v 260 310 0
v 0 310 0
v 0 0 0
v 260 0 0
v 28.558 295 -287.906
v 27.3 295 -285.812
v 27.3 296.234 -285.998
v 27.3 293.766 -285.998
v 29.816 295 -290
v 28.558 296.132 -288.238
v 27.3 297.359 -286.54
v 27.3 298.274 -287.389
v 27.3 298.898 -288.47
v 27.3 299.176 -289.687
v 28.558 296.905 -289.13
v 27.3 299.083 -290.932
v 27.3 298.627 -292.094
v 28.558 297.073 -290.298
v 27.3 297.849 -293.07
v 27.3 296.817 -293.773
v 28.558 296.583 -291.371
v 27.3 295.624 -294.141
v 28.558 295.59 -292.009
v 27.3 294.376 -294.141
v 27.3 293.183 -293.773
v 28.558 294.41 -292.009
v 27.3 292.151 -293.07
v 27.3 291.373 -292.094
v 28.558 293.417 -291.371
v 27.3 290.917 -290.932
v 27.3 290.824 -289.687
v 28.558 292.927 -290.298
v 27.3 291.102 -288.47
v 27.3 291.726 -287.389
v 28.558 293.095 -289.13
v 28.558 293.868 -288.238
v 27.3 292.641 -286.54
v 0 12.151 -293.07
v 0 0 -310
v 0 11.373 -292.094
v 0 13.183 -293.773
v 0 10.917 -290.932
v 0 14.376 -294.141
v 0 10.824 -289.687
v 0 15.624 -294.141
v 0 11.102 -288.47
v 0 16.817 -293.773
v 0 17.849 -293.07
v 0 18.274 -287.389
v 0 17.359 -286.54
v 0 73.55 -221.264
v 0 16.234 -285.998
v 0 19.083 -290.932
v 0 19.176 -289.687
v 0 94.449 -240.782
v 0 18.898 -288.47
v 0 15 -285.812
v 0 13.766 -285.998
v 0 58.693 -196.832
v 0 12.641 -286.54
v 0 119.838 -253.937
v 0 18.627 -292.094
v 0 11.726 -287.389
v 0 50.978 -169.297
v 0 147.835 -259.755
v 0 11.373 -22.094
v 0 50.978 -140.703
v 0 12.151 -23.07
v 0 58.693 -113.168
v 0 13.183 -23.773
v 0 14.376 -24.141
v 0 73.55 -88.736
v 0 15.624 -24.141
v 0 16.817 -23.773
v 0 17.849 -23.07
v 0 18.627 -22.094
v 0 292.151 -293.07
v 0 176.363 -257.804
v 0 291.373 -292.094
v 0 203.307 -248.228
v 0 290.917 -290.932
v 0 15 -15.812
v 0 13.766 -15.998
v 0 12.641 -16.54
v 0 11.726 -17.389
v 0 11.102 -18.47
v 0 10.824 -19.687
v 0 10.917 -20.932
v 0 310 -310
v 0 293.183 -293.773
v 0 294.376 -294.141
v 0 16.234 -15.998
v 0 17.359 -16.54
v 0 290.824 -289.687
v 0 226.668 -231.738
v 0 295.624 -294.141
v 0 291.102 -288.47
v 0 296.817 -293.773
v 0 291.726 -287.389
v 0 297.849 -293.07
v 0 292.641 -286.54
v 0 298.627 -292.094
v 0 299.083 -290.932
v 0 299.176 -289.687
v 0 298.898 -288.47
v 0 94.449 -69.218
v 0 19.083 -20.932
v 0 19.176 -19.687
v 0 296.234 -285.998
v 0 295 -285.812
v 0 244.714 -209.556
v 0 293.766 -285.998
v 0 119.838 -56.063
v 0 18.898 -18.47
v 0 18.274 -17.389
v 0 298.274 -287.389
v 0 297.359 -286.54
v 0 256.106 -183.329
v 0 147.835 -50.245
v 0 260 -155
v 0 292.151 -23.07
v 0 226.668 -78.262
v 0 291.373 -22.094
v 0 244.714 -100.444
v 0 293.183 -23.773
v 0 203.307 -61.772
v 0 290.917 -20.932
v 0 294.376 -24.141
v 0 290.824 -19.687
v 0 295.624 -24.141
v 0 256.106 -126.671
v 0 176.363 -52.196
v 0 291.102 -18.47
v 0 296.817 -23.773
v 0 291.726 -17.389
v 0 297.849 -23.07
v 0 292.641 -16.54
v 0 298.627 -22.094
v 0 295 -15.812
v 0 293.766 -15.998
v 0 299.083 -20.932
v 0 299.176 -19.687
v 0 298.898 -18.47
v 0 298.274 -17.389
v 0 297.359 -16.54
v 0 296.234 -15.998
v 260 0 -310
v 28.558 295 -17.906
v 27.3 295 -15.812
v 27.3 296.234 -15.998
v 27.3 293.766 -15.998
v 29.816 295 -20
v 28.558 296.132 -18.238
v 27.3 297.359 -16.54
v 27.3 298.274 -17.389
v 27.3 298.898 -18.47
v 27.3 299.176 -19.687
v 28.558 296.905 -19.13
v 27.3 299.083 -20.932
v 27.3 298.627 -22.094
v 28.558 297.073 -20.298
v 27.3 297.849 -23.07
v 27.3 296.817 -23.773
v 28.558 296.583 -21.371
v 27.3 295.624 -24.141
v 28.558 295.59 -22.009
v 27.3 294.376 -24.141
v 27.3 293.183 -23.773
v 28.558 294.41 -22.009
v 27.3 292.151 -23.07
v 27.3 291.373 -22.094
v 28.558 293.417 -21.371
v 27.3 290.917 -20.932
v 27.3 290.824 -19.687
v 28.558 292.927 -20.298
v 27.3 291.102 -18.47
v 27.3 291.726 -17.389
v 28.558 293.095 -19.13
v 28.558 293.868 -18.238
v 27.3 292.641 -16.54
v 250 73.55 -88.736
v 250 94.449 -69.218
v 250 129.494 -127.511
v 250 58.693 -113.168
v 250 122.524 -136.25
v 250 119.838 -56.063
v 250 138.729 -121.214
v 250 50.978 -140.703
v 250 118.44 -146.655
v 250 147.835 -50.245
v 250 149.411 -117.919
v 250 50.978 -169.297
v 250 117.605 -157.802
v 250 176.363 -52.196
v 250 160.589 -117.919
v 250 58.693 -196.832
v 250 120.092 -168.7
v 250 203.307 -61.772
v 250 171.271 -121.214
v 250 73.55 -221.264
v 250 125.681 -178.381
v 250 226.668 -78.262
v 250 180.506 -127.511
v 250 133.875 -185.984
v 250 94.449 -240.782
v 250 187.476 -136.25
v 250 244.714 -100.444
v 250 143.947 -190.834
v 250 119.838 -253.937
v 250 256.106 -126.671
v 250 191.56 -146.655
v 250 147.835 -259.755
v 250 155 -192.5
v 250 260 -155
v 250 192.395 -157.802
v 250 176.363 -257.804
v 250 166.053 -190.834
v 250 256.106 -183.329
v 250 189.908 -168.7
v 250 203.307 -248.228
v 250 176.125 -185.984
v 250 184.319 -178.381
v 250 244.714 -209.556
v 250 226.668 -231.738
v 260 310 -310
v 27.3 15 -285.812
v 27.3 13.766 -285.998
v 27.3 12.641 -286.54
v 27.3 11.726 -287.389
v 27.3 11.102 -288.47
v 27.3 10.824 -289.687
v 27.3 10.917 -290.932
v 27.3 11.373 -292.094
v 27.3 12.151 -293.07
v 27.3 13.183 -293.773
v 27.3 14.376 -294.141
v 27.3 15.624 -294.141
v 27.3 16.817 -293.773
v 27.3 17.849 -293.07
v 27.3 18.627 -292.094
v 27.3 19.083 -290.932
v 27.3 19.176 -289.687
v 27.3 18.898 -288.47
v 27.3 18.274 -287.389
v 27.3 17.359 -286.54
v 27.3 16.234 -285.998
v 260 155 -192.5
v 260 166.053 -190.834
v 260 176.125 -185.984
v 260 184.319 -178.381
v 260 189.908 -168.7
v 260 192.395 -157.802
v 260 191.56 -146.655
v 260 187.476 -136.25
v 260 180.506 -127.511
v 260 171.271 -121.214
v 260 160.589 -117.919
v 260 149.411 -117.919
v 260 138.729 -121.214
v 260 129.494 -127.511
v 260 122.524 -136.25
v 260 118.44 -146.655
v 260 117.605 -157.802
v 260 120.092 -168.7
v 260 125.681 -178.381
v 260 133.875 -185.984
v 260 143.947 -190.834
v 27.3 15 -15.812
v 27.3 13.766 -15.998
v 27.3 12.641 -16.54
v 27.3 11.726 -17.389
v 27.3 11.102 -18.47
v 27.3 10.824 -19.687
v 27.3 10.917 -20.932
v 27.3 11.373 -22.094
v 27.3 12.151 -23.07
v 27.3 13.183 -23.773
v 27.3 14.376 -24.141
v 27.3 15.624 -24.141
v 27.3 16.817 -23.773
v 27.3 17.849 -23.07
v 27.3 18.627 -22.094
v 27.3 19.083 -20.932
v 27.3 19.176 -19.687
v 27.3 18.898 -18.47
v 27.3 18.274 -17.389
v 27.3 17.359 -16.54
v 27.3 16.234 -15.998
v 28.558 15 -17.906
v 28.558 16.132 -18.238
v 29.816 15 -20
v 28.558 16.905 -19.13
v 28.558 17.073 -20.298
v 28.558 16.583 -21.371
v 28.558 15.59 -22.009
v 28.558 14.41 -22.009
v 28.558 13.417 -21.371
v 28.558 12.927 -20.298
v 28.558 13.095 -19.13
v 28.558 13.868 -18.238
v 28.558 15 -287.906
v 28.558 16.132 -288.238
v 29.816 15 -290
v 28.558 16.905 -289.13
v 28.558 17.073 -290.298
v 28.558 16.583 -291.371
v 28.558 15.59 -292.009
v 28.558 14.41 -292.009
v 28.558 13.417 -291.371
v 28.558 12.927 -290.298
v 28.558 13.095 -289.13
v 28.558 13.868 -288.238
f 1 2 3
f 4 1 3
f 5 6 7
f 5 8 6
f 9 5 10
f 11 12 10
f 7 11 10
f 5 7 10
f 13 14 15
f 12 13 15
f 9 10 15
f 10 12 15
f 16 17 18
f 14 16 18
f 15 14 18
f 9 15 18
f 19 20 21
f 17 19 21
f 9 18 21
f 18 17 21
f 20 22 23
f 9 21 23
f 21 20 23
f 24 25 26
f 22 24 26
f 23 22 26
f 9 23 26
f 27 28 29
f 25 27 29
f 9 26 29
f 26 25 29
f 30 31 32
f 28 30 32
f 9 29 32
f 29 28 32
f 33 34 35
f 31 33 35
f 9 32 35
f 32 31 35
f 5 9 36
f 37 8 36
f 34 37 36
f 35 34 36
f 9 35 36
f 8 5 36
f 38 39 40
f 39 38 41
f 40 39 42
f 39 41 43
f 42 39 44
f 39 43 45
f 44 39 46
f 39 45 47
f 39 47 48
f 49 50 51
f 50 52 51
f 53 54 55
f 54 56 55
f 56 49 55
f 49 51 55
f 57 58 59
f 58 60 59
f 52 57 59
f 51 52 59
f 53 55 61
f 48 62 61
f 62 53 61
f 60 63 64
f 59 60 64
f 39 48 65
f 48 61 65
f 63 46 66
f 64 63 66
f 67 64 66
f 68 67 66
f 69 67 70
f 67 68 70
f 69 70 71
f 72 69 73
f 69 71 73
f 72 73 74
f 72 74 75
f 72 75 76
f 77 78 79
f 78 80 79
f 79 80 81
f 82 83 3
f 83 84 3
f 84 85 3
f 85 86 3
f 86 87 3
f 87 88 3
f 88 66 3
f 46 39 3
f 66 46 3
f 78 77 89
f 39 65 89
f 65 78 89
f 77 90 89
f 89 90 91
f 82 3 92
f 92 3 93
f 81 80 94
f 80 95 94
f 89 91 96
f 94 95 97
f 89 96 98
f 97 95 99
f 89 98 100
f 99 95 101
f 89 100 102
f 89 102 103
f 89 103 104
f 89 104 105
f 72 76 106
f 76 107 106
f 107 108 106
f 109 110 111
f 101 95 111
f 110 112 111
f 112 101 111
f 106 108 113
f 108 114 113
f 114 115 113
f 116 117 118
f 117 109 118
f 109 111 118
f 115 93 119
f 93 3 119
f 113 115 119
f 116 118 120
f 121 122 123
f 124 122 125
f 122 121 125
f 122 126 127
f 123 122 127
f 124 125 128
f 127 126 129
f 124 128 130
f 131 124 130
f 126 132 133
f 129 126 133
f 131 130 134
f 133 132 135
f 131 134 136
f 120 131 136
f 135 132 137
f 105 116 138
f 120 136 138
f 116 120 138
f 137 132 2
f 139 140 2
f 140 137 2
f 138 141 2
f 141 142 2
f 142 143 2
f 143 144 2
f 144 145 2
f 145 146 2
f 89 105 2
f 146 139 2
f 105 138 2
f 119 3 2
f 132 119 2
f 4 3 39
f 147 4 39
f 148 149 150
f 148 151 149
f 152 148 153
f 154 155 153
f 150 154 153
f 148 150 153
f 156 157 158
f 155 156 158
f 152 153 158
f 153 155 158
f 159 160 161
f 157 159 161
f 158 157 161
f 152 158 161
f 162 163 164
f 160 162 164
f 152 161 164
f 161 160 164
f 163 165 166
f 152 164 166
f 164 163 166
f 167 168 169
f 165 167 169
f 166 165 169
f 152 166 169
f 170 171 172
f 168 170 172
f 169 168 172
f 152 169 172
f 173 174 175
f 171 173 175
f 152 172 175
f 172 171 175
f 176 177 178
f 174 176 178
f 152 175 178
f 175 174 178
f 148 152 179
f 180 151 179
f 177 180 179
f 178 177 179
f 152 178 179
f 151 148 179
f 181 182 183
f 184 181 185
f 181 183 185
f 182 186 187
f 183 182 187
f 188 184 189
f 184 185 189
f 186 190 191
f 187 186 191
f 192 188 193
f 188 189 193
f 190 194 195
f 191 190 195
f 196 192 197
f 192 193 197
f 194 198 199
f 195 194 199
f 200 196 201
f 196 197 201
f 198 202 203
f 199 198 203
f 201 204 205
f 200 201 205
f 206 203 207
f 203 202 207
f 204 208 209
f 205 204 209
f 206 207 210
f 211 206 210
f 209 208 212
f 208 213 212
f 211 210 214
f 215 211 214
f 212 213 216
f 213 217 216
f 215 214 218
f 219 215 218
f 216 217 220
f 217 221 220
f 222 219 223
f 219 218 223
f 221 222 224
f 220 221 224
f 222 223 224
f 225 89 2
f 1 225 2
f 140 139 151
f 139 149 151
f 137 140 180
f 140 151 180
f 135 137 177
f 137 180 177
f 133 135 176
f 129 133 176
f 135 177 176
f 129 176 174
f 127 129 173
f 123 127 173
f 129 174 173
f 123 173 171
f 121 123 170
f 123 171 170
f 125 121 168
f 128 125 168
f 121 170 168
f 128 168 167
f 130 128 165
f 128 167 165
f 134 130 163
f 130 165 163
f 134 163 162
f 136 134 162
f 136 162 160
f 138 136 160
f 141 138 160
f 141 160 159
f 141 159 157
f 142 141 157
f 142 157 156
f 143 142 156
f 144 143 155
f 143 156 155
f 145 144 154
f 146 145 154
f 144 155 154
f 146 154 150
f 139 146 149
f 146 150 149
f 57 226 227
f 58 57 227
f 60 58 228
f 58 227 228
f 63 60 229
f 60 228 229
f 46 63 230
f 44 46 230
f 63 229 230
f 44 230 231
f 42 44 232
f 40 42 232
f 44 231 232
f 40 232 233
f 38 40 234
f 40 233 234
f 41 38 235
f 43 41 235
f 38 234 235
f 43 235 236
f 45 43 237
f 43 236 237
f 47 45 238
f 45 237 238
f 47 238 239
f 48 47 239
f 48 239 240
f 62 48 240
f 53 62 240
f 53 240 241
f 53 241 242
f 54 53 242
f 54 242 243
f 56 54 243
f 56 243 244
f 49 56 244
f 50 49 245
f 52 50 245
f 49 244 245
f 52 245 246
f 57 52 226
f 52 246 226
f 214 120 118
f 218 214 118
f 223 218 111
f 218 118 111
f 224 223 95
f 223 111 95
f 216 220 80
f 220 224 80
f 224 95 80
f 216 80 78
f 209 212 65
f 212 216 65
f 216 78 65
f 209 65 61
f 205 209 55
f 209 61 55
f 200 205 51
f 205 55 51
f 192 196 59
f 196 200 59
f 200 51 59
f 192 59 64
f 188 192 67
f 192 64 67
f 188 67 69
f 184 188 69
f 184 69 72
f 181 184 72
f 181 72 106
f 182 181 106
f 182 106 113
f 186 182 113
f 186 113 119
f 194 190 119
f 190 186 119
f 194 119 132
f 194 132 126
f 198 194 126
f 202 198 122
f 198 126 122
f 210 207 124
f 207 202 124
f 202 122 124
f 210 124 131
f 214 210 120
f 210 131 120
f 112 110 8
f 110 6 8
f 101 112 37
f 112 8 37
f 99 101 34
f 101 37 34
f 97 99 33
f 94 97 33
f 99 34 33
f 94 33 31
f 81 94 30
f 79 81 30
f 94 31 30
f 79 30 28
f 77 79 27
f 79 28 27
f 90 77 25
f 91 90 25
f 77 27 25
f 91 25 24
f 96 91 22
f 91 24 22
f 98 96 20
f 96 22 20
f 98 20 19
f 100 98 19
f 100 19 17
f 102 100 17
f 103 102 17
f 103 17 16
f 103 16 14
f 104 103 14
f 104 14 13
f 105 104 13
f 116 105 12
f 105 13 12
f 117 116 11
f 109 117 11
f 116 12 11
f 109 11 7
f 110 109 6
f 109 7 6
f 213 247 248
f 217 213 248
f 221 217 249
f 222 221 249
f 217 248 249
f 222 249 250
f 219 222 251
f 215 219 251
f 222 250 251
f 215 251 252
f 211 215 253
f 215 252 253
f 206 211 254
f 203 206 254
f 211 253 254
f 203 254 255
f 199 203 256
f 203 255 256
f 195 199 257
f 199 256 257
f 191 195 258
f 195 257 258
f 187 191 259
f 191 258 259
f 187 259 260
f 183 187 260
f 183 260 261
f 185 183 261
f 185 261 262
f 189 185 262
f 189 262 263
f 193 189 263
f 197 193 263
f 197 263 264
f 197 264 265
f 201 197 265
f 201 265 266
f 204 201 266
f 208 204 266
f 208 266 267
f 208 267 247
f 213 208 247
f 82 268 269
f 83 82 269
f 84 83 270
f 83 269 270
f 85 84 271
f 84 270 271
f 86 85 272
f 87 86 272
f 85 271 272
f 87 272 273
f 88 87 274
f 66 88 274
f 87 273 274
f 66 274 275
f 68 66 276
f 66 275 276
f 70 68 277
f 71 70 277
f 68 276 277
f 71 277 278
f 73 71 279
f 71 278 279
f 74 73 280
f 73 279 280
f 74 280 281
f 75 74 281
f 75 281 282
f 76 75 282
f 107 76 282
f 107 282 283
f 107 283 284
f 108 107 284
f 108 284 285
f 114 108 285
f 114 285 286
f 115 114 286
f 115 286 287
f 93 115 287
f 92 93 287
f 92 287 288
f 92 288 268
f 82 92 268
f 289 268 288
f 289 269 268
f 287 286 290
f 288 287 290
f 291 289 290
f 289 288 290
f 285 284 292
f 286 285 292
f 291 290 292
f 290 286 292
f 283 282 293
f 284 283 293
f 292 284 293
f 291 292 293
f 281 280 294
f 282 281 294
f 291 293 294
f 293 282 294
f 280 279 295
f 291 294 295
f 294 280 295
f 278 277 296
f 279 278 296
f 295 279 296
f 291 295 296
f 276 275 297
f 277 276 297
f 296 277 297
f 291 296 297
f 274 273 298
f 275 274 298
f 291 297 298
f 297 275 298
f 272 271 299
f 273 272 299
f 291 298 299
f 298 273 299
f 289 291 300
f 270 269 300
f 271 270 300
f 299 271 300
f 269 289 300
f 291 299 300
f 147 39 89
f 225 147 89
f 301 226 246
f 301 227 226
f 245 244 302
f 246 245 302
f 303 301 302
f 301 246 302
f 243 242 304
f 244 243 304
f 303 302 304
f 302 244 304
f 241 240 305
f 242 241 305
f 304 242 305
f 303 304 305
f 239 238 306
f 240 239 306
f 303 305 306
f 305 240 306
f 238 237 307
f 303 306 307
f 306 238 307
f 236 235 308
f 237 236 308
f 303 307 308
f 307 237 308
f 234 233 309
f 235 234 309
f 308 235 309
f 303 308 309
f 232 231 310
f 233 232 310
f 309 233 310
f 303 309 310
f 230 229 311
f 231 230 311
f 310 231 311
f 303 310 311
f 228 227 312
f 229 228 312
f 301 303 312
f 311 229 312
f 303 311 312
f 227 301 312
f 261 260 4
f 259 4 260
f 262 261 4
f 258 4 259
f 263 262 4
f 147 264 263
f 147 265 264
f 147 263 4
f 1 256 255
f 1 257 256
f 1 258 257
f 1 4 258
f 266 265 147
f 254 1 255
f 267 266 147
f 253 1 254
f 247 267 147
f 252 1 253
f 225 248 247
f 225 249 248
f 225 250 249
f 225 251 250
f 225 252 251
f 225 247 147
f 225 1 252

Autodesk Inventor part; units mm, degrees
ref_plane "YZ Plane" through (0, 0, 0) normal (1, 0, 0) x (0, 1, 0)
ref_plane "XZ Plane" through (0, 0, 0) normal (0, 1, 0) x (-1, 0, 0)
ref_plane "XY Plane" through (0, 0, 0) normal (0, 0, 1) x (1, 0, 0)
sketch "Skizze1" plane through (0, 0, 0) normal (1, 0, 0) x (0, 1, 0)
  line L0 (0, 0) -> (310, 0)
  line L1 (310, 0) -> (310, -310)
  line L2 (310, -310) -> (0, -310)
  line L3 (0, -310) -> (0, 0)
  dimension "d0" = 310
  dimension "d1" = 310
sketch "Skizze2" plane through (0, 0, 0) normal (1, 0, 0) x (0, 1, 0)
  circle A0 centre (155, -155) radius 105
  point P0 (0, 0)
  dimension "d4" = 210
extrude "Extrusion1" add sketch "Skizze1" along normal blind 250
extrude "Extrusion2" cut sketch "Skizze2" along normal blind 250
sketch "Skizze3" plane through (250, 0, 0) normal (1, 0, 0) x (0, 0, -1)
  line L0 (0, 310) -> (0, 0) projected
  line L1 (310, 310) -> (0, 310) projected
  line L2 (0, 0) -> (310, 0)
  line L3 (310, 0) -> (310, 310)
  line L4 (310, 310) -> (0, 310)
  line L5 (0, 310) -> (0, 0)
extrude "Extrusion3" add sketch "Skizze3" along normal blind 10
sketch "Skizze4" plane through (260, 0, 0) normal (1, 0, 0) x (0, 0, -1)
  circle A0 centre (155, 155) radius 37.5
  point P0 (0, 0)
  dimension "d13" = 75
extrude "Extrusion4" cut sketch "Skizze4" against normal blind 10
sketch "Skizze5" plane through (0, 0, 0) normal (-1, 0, 0) x (0, 0, 1)
  line L0 (-310, 0) -> (-310, 310) projected
  line L1 (-310, 310) -> (-290, 310)
  line L2 (-290, 310) -> (-290, 295)
  line L3 (-290, 295) -> (-310, 295)
  line L4 (-310, 295) -> (-310, 310)
  line L5 (-310, 310) -> (0, 310) projected
  line L6 (0, 310) -> (-20, 310)
  line L7 (-20, 310) -> (-20, 295)
  line L8 (-20, 295) -> (0, 295)
  line L9 (0, 295) -> (0, 310)
  line L10 (0, 0) -> (-310, 0) projected
  line L11 (0, 0) -> (-20, 0)
  line L12 (-20, 0) -> (-20, 15)
  line L13 (-20, 15) -> (0, 15)
  line L14 (0, 15) -> (0, 0)
  line L15 (-310, 0) -> (-290, 0)
  line L16 (-290, 0) -> (-290, 15)
  line L17 (-290, 15) -> (-310, 15)
  line L18 (-310, 15) -> (-310, 0)
  dimension "d16" = 20
  dimension "d17" = 15
  dimension "d18" = 20
  dimension "d19" = 15
hole "Bohrung1" at (0, 295, -290) at (0, 295, -20) at (0, 15, -20) at (0, 15, -290) direction (1, 0, 0) diameter 8.376 depth 27.3 tip angle 118 thread size "M10x1.5" class "6H" standard "ISO Metric profile"
properties part number "Führung_hochfahren"
